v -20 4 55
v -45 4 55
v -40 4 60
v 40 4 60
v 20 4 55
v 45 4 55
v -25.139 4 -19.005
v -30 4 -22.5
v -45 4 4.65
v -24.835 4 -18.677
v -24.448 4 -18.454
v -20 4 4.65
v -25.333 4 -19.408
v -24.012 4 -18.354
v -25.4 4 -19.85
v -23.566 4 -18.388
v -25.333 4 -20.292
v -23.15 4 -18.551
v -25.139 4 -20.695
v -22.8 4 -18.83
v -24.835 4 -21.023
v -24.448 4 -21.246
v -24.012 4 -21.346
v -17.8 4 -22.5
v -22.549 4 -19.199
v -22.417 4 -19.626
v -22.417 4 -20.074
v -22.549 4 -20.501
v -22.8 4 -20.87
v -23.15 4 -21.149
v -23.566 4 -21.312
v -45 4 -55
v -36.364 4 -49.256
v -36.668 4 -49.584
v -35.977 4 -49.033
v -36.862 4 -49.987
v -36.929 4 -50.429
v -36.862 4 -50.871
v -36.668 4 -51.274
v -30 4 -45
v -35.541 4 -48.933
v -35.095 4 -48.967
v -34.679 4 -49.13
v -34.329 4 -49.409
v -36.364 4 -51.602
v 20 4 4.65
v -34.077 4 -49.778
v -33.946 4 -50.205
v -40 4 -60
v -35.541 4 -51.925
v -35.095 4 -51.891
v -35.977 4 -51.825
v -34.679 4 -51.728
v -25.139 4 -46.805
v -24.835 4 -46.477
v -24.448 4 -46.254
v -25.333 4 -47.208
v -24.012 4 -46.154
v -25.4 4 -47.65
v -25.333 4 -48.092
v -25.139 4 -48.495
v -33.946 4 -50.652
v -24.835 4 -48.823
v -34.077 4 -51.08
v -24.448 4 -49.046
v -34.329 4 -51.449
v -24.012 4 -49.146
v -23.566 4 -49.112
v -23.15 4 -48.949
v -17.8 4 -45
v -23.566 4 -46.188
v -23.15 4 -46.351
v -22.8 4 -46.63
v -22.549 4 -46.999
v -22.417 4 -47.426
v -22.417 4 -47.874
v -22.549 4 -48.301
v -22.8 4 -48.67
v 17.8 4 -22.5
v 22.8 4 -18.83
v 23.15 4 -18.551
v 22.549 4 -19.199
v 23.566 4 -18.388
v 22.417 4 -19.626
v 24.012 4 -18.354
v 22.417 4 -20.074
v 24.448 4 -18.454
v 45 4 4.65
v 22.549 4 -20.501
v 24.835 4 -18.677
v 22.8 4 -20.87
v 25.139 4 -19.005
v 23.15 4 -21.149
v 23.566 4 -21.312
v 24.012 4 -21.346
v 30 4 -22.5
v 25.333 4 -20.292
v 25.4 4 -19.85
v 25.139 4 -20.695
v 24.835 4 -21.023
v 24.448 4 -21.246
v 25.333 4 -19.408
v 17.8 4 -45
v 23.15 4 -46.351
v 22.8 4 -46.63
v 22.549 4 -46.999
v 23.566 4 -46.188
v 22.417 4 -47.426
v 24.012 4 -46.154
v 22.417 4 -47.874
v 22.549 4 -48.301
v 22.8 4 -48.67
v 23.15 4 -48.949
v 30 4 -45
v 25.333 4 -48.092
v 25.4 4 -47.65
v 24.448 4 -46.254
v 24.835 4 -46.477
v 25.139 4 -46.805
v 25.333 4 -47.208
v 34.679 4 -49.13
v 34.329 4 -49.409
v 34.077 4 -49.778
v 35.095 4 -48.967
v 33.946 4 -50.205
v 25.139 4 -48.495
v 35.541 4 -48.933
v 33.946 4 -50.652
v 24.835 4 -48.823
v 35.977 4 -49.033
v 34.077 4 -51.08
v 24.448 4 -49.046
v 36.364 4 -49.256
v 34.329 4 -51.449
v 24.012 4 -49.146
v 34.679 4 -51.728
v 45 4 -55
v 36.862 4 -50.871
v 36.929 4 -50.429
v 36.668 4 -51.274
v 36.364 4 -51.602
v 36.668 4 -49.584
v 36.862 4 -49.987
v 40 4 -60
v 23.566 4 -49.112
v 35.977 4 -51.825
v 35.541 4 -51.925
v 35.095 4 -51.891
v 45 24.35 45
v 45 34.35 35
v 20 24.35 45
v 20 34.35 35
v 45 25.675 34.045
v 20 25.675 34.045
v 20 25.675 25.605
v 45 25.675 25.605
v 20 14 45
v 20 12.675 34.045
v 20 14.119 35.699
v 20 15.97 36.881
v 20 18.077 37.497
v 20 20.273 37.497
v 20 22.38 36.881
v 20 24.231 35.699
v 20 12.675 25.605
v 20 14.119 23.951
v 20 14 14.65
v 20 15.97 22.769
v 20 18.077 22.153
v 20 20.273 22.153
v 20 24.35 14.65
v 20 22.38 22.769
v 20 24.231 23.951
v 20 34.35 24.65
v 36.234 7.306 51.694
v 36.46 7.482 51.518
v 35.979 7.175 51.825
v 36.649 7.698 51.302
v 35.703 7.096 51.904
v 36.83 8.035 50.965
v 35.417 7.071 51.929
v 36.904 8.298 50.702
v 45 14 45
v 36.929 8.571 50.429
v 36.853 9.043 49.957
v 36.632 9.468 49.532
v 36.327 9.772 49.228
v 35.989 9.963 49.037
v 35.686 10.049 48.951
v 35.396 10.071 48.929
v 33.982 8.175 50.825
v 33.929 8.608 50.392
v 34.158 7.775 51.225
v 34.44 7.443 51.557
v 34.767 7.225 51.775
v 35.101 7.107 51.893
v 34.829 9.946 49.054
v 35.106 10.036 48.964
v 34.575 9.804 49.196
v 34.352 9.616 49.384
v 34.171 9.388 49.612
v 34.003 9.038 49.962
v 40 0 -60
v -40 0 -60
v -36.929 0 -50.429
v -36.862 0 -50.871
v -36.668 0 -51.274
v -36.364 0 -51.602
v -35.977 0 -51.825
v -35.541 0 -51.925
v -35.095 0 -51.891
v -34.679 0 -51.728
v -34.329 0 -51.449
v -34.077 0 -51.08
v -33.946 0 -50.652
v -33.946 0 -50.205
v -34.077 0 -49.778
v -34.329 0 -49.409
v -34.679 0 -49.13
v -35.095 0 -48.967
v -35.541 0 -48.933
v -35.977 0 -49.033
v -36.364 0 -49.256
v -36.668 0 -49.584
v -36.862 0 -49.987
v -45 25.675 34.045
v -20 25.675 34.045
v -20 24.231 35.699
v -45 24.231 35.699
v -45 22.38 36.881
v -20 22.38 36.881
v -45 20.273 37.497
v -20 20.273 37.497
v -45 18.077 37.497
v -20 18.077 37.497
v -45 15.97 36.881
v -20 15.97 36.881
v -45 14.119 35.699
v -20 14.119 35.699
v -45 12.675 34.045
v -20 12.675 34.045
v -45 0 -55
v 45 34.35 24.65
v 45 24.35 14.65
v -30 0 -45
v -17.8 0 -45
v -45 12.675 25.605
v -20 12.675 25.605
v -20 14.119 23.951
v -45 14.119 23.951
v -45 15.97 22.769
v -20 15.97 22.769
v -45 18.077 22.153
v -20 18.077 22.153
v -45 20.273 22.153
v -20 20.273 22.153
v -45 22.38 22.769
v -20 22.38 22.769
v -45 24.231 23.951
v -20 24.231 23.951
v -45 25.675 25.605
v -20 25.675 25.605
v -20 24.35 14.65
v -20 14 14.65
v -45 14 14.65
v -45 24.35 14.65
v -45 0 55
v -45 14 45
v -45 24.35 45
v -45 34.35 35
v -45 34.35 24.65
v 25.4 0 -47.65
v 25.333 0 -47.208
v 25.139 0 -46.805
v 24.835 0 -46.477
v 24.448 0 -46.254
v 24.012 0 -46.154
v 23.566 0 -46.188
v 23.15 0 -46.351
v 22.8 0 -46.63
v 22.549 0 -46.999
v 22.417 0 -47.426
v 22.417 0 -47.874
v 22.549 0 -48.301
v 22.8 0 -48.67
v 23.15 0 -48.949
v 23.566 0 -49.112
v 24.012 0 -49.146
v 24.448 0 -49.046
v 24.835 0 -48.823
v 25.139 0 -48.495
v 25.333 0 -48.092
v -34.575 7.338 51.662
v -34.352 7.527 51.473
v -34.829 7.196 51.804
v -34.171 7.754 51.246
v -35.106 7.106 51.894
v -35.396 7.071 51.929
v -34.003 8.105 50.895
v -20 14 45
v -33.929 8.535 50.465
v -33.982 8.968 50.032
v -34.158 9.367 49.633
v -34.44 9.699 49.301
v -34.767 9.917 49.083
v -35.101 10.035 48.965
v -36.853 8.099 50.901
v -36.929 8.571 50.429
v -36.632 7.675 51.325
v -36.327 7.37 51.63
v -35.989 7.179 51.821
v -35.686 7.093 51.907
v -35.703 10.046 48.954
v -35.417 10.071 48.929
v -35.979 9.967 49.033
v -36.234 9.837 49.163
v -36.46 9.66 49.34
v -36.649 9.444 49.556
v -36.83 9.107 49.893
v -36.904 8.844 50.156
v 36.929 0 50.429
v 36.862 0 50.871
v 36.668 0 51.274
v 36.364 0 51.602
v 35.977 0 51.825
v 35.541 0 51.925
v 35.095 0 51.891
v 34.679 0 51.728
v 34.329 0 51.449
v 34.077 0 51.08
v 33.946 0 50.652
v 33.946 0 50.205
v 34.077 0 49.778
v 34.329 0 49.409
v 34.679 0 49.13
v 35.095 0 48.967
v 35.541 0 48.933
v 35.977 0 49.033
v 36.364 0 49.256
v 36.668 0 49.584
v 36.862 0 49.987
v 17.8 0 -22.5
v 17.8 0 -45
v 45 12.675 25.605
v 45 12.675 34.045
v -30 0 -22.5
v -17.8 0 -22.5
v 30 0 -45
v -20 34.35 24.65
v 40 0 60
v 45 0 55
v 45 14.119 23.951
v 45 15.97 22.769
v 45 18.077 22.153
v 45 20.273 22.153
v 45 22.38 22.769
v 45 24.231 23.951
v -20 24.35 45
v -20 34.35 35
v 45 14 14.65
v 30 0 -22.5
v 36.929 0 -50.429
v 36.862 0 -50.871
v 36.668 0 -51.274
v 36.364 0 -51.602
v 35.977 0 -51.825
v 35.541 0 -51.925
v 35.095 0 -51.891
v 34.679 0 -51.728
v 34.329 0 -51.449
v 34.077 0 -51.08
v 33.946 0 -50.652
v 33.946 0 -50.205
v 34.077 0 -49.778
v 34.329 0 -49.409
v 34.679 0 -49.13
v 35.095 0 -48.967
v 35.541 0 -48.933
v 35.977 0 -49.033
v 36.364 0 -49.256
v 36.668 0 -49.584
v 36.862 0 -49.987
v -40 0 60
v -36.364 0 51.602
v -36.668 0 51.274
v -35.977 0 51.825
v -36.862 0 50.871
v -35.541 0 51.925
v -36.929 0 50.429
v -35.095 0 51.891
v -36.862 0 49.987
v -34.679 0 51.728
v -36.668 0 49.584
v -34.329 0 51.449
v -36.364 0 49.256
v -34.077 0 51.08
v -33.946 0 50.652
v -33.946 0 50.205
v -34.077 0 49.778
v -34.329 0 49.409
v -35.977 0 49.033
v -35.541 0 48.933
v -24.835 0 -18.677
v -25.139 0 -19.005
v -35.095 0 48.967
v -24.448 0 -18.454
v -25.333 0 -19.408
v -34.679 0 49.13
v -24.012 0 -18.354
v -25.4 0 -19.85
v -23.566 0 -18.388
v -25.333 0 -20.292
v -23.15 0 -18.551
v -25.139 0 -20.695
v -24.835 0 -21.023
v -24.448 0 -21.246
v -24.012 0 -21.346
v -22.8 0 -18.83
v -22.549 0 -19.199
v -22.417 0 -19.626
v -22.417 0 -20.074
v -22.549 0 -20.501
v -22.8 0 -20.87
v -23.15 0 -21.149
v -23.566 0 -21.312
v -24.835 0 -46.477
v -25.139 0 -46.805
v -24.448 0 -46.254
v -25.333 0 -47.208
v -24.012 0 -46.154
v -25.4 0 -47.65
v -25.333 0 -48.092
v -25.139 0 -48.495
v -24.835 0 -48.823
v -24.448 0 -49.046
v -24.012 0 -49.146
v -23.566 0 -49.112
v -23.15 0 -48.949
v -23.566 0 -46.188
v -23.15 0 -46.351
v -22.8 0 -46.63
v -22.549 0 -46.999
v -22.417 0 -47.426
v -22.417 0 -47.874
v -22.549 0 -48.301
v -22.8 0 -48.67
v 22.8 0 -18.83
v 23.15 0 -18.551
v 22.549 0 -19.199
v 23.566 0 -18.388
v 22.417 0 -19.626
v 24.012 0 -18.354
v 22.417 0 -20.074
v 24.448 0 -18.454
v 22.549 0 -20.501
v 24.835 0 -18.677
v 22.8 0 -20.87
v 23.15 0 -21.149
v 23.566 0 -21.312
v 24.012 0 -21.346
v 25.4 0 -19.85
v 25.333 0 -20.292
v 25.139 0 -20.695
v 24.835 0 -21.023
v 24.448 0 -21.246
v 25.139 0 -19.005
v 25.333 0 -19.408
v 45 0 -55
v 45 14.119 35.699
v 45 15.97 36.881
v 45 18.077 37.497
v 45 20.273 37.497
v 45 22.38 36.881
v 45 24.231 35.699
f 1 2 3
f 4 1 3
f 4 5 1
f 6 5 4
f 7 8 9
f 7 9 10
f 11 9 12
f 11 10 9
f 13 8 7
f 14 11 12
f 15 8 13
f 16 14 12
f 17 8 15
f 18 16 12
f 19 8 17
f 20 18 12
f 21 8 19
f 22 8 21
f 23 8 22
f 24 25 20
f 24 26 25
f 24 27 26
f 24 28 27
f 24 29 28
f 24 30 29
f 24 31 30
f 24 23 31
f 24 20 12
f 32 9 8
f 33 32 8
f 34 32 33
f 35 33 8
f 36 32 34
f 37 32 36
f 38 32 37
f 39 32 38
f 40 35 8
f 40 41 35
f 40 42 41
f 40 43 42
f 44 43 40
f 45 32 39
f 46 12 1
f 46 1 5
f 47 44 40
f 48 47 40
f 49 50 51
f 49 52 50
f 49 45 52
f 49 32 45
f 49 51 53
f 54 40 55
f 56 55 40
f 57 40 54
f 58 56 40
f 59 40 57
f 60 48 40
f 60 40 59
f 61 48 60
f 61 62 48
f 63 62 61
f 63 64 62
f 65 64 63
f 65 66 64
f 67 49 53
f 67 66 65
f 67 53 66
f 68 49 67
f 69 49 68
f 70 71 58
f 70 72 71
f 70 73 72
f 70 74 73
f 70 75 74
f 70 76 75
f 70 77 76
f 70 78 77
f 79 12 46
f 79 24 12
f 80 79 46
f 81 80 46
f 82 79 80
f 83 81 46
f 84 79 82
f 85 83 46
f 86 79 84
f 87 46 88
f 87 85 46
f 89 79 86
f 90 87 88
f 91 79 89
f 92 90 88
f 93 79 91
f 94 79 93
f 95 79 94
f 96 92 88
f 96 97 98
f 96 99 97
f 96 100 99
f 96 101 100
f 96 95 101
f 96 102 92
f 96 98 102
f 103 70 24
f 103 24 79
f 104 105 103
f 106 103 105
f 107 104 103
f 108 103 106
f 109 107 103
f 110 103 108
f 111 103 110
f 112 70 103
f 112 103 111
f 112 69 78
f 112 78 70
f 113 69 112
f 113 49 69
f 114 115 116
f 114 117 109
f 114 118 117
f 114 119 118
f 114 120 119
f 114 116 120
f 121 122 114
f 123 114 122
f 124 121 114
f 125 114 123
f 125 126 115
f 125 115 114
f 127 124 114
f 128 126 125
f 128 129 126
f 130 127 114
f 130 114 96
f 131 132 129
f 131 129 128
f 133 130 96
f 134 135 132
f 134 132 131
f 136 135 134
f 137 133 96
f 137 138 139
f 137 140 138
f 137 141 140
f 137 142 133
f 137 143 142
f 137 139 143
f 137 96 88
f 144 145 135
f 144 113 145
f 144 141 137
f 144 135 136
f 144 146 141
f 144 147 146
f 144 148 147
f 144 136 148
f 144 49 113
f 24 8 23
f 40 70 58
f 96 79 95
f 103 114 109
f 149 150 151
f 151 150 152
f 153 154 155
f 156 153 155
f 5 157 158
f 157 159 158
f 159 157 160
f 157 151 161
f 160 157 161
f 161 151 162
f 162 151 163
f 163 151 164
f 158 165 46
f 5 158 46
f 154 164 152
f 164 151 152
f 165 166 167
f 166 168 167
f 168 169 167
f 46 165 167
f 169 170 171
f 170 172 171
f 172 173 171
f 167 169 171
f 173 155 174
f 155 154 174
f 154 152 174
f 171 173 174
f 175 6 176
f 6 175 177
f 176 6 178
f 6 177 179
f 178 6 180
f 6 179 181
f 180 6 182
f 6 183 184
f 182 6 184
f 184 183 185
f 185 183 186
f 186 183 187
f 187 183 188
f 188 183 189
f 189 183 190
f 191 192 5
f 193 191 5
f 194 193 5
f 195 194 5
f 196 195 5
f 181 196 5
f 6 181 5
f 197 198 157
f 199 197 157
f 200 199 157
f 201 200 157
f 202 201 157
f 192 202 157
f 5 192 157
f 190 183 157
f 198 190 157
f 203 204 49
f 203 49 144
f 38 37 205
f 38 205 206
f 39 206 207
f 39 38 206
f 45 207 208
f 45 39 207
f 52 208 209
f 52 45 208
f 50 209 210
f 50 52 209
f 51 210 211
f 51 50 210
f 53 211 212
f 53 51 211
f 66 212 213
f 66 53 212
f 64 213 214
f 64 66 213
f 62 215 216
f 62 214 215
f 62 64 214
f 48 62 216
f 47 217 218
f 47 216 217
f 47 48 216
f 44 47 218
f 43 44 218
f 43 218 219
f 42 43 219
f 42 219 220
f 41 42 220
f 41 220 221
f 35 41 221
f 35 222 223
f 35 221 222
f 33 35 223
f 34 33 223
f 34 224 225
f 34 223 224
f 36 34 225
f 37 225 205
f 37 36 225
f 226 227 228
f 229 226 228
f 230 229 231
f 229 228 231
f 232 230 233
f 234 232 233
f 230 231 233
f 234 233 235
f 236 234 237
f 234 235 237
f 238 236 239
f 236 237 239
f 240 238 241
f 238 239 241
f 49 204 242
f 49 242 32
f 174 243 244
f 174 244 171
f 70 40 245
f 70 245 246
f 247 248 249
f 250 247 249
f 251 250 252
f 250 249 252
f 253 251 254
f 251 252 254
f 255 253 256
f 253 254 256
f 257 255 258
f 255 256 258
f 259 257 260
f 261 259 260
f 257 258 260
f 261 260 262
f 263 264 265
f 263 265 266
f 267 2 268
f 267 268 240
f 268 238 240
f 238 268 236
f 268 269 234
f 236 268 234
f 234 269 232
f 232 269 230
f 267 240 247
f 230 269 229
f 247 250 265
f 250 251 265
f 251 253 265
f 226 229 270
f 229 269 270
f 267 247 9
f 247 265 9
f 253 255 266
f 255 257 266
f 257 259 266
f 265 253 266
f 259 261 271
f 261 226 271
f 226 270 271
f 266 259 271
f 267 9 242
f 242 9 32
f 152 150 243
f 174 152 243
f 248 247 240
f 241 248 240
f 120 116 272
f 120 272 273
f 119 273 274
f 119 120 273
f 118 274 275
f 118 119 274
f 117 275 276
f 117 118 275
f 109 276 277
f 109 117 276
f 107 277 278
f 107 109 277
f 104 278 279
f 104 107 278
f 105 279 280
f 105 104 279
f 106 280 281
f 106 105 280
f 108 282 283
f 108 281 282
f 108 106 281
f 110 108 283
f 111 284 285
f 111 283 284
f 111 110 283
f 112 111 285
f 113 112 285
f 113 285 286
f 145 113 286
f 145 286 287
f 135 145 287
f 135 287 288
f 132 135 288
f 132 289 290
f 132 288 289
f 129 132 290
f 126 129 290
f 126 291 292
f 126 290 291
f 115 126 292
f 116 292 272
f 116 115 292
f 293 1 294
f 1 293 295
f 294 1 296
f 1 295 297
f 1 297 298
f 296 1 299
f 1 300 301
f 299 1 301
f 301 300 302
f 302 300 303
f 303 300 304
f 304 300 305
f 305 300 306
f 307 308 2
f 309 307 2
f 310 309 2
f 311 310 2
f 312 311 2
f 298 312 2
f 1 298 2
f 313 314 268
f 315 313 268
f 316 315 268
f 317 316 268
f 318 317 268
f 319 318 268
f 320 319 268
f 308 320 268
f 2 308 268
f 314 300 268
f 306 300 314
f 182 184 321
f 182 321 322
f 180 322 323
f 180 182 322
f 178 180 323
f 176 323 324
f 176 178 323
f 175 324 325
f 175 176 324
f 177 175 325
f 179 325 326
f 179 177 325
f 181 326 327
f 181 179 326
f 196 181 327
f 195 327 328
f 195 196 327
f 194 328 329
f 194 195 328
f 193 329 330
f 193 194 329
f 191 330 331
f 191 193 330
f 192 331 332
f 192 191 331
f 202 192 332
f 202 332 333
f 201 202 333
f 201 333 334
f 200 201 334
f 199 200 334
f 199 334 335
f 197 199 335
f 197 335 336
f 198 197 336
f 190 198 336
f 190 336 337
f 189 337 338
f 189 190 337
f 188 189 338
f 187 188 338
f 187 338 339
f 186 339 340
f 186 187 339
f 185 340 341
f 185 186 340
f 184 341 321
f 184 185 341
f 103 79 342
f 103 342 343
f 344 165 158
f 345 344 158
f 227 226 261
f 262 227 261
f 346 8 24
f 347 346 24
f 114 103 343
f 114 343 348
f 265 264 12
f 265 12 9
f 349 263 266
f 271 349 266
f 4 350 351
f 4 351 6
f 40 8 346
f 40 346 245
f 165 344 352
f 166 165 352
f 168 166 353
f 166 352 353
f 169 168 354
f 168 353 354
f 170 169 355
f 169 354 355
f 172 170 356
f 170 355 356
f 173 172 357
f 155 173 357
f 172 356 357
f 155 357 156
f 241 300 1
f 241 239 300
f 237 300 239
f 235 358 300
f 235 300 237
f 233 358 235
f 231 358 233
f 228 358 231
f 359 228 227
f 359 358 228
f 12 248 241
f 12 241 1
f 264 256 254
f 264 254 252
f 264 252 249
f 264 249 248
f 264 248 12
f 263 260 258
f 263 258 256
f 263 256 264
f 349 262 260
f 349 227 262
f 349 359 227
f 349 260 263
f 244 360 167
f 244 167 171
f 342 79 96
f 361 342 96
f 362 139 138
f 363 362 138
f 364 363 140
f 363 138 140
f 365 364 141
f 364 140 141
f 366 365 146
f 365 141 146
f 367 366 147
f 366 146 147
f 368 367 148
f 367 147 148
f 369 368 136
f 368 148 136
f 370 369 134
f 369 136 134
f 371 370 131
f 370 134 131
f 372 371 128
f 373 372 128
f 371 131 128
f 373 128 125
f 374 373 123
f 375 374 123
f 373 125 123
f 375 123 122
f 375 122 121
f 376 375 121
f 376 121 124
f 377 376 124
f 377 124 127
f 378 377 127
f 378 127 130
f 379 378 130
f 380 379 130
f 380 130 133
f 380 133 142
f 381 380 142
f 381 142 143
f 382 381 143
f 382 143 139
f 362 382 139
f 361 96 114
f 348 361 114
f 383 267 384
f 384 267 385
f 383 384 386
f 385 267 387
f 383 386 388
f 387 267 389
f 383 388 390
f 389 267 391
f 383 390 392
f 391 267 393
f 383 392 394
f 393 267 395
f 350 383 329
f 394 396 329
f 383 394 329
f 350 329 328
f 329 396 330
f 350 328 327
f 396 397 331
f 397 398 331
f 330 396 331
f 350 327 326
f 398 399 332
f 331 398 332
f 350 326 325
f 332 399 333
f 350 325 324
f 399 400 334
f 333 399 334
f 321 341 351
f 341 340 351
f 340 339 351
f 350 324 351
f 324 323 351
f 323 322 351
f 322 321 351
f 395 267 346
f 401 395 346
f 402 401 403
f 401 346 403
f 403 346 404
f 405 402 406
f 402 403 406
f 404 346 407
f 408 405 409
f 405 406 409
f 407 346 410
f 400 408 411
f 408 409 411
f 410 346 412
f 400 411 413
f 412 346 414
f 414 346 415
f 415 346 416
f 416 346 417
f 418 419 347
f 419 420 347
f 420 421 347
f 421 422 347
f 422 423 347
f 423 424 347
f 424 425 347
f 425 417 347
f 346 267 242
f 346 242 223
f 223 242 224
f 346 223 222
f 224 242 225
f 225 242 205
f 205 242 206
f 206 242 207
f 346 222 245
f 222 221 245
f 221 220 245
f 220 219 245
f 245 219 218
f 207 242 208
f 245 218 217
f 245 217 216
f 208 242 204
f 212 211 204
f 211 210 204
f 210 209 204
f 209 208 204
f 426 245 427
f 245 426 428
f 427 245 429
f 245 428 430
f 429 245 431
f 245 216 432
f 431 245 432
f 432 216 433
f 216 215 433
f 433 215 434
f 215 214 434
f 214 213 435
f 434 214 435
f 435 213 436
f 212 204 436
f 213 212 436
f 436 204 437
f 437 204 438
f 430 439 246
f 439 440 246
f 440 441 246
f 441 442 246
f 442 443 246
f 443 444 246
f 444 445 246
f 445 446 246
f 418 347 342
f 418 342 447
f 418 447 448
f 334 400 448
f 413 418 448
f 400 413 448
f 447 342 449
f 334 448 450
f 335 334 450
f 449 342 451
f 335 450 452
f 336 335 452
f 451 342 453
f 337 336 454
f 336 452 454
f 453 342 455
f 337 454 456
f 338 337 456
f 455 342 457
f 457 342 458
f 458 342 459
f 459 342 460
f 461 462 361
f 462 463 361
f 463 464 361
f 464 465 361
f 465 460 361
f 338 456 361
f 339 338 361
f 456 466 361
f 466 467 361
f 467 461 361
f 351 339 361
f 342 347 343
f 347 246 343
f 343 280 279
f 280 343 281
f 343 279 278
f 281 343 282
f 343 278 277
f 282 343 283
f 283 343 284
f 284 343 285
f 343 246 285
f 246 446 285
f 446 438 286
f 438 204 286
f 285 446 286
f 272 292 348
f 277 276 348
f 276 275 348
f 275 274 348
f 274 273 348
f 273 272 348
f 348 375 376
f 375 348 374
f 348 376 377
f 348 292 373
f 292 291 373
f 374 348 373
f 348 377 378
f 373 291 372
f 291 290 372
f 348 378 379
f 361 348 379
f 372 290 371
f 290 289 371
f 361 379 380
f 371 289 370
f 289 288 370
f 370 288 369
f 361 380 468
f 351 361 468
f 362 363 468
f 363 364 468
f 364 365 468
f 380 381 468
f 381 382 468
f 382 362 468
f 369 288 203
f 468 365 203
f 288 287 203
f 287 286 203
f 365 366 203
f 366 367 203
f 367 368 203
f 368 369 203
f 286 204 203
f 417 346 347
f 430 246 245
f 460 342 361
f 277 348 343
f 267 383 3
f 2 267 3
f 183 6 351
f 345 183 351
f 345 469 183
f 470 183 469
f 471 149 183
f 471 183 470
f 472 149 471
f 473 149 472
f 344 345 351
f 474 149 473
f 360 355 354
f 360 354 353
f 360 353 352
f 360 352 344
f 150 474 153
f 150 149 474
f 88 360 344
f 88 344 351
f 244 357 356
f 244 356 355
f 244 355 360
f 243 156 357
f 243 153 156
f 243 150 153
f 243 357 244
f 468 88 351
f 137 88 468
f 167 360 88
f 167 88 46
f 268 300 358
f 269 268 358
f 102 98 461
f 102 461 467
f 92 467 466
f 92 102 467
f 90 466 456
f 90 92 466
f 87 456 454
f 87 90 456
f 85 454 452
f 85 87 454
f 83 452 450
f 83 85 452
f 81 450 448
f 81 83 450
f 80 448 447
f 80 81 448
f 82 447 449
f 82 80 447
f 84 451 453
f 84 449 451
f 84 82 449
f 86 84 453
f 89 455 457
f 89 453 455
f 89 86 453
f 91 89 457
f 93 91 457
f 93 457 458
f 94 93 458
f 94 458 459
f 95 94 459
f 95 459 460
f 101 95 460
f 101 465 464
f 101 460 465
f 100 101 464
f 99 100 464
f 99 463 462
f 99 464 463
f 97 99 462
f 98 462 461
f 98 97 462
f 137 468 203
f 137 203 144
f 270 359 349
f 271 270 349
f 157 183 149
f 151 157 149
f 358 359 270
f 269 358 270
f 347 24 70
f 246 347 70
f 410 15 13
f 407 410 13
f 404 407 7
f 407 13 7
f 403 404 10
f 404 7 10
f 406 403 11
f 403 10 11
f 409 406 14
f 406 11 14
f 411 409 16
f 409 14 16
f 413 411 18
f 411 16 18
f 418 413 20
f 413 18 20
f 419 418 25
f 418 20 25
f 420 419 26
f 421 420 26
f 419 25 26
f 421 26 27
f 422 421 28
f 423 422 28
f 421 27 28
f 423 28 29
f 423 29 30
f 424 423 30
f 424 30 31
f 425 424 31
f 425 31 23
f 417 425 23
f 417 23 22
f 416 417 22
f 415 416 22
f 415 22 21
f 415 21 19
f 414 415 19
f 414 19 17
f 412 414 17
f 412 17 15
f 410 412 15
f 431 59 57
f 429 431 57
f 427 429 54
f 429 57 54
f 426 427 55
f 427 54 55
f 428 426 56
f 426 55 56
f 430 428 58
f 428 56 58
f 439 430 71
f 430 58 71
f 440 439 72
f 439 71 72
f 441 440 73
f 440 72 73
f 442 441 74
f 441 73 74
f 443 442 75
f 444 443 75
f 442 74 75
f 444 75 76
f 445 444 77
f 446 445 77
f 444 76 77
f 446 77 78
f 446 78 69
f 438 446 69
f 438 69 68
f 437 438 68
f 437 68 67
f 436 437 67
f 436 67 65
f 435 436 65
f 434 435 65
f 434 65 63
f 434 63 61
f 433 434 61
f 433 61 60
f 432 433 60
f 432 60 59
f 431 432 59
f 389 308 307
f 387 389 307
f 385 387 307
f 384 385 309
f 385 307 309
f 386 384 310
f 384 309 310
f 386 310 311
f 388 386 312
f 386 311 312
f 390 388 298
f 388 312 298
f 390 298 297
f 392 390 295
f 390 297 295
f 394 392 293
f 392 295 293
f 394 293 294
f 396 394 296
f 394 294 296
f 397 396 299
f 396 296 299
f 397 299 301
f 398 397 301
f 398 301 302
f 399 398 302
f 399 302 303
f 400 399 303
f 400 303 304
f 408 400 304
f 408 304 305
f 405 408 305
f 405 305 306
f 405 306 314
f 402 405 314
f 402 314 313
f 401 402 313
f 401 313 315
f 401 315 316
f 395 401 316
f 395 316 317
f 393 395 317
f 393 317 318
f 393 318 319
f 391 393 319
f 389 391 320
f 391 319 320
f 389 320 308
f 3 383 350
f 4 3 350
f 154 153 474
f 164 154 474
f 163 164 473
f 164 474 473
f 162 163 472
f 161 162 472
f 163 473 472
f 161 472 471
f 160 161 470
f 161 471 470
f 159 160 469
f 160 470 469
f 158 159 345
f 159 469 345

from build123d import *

# Parameters (mm, degrees)
SKETCH1_W                            = 90
SKETCH1_H                            = 120
BOSS_EXTRUDE2_DEPTH                  = 4
SKETCH5_W                            = 12.2
SKETCH5_H                            = 22.5
CUT_EXTRUDE1_DEPTH                   = 76.106590923
BOSS_EXTRUDE4_START                  = 45
SKETCH10_W                           = 30.35
SKETCH10_H                           = 30.35
SKETCH10_R                           = 7.75
BOSS_EXTRUDE4_DEPTH                  = 25
BOSS_EXTRUDE5_START                  = -20
SKETCH10_4_W                         = 30.35
SKETCH10_4_H                         = 30.35
SKETCH10_4_R                         = 7.75
BOSS_EXTRUDE5_DEPTH                  = 25
CHAMFER6_SIZE                        = 5
CHAMFER7_SIZE                        = 10
F_3_0_3_DIAMETER_HOLE2_D             = 3
MIRROR9_AT_THE_SECOND_PLANE_COPY_1_D = 3
F_3_0_3_DIAMETER_HOLE3_D             = 3


with BuildPart() as part:
    # Sketch1 → Boss-Extrude2 (new body)
    with BuildSketch(Plane(origin=(0, 0, 0), x_dir=(1, 0, 0), z_dir=(0, 1, 0))):
        Rectangle(SKETCH1_W, SKETCH1_H)
    extrude(amount=BOSS_EXTRUDE2_DEPTH)

    # Sketch5 → Cut-Extrude1 (cut, through all)
    with BuildSketch(Plane(origin=(0, 4, 0), x_dir=(1, 0, 0), z_dir=(0, 1, 0))):
        with Locations((-23.9, 33.75)):
            Rectangle(SKETCH5_W, SKETCH5_H)
        with Locations((23.9, 33.75)):
            Rectangle(SKETCH5_W, SKETCH5_H)
    extrude(amount=-CUT_EXTRUDE1_DEPTH, mode=Mode.SUBTRACT)

    # Sketch10 → Boss-Extrude4 (add)
    # profile 1 of 3: a face of its own
    with BuildSketch(Plane(origin=(0, 0, 0), x_dir=(0, 0, -1), z_dir=(1, 0, 0)).offset(BOSS_EXTRUDE4_START)):
        with Locations((-29.825, 19.175)):
            Rectangle(SKETCH10_W, SKETCH10_H)
        with Locations((-29.825, 19.175)):
            Circle(SKETCH10_R, mode=Mode.SUBTRACT)
    # profile 2 of 3: a face of its own
    with BuildSketch(Plane(origin=(0, 0, 0), x_dir=(0, 0, -1), z_dir=(1, 0, 0)).offset(BOSS_EXTRUDE4_START)):
        with BuildLine():
            ThreePointArc((-25.604514246, 25.675), (-29.825, 26.925), (-34.045485754, 25.675))
            Line((-34.045485754, 25.675), (-25.604514246, 25.675))
        make_face()
    # profile 3 of 3: a face of its own
    with BuildSketch(Plane(origin=(0, 0, 0), x_dir=(0, 0, -1), z_dir=(1, 0, 0)).offset(BOSS_EXTRUDE4_START)):
        with BuildLine():
            Line((-25.604514246, 12.675), (-34.045485754, 12.675))
            ThreePointArc((-34.045485754, 12.675), (-29.825, 11.425), (-25.604514246, 12.675))
        make_face()
    extrude(amount=-BOSS_EXTRUDE4_DEPTH)

    # Sketch10<4> → Boss-Extrude5 (add)
    # profile 1 of 3: a face of its own
    with BuildSketch(Plane(origin=(0, 0, 0), x_dir=(0, 0, -1), z_dir=(1, 0, 0)).offset(BOSS_EXTRUDE5_START)):
        with Locations((-29.825, 19.175)):
            Rectangle(SKETCH10_4_W, SKETCH10_4_H)
        with Locations((-29.825, 19.175)):
            Circle(SKETCH10_4_R, mode=Mode.SUBTRACT)
    # profile 2 of 3: a face of its own
    with BuildSketch(Plane(origin=(0, 0, 0), x_dir=(0, 0, -1), z_dir=(1, 0, 0)).offset(BOSS_EXTRUDE5_START)):
        with BuildLine():
            ThreePointArc((-25.604514246, 25.675), (-29.825, 26.925), (-34.045485754, 25.675))
            Line((-34.045485754, 25.675), (-25.604514246, 25.675))
        make_face()
    # profile 3 of 3: a face of its own
    with BuildSketch(Plane(origin=(0, 0, 0), x_dir=(0, 0, -1), z_dir=(1, 0, 0)).offset(BOSS_EXTRUDE5_START)):
        with BuildLine():
            Line((-25.604514246, 12.675), (-34.045485754, 12.675))
            ThreePointArc((-34.045485754, 12.675), (-29.825, 11.425), (-25.604514246, 12.675))
        make_face()
    extrude(amount=-BOSS_EXTRUDE5_DEPTH)

    # Chamfer6
    chamfer6_edges = [part.edges().sort_by_distance(p)[0] for p in [
        (-45, 2, 60),
        (-45, 2, -60),
        (45, 2, -60),
        (45, 2, 60),
    ]]
    chamfer(chamfer6_edges, length=CHAMFER6_SIZE)

    # Chamfer7
    chamfer7_edges = [part.edges().sort_by_distance(p)[0] for p in [
        (32.5, 4, 45),
        (32.5, 34.35, 45),
        (32.5, 34.35, 14.65),
        (32.5, 4, 14.65),
        (-32.5, 34.35, 45),
        (-32.5, 4, 45),
        (-32.5, 4, 14.65),
        (-32.5, 34.35, 14.65),
    ]]
    chamfer(chamfer7_edges, length=CHAMFER7_SIZE)

    # Ø3.0 (3) Diameter Hole2 (through all)
    with Locations(Plane.XZ):
        with Locations((-35.428932188, 50.428932188)):
            f_3_0_3_diameter_hole2 = Hole(F_3_0_3_DIAMETER_HOLE2_D / 2)

    # Mirror9: Ø3.0 (3) Diameter Hole2 across plane
    add(f_3_0_3_diameter_hole2.mirror(Plane.XY), mode=Mode.SUBTRACT)

    # Mirror9 at the second plane: Ø3.0 (3) Diameter Hole2 across plane
    add(f_3_0_3_diameter_hole2.mirror(Plane(origin=(0, 0, 0), x_dir=(0, 0, 1), z_dir=(1, 0, 0))), mode=Mode.SUBTRACT)

    # Mirror9 at the second plane copy 1 (through all)
    with Locations(Plane(origin=(0, 0, 0), x_dir=(-1, 0, 0), z_dir=(0, -1, 0))):
        with Locations((-35.428932188, 50.428932188)):
            Hole(MIRROR9_AT_THE_SECOND_PLANE_COPY_1_D / 2)

    # Ø3.0 (3) Diameter Hole3 (through all)
    with Locations(Plane.XZ):
        with Locations((-23.9, -19.85), (-23.9, -47.65)):
            f_3_0_3_diameter_hole3 = Hole(F_3_0_3_DIAMETER_HOLE3_D / 2)

    # Mirror10: Ø3.0 (3) Diameter Hole3 across plane
    add(f_3_0_3_diameter_hole3.mirror(Plane(origin=(0, 0, 0), x_dir=(0, 0, 1), z_dir=(1, 0, 0))), mode=Mode.SUBTRACT)


solid = part.part
